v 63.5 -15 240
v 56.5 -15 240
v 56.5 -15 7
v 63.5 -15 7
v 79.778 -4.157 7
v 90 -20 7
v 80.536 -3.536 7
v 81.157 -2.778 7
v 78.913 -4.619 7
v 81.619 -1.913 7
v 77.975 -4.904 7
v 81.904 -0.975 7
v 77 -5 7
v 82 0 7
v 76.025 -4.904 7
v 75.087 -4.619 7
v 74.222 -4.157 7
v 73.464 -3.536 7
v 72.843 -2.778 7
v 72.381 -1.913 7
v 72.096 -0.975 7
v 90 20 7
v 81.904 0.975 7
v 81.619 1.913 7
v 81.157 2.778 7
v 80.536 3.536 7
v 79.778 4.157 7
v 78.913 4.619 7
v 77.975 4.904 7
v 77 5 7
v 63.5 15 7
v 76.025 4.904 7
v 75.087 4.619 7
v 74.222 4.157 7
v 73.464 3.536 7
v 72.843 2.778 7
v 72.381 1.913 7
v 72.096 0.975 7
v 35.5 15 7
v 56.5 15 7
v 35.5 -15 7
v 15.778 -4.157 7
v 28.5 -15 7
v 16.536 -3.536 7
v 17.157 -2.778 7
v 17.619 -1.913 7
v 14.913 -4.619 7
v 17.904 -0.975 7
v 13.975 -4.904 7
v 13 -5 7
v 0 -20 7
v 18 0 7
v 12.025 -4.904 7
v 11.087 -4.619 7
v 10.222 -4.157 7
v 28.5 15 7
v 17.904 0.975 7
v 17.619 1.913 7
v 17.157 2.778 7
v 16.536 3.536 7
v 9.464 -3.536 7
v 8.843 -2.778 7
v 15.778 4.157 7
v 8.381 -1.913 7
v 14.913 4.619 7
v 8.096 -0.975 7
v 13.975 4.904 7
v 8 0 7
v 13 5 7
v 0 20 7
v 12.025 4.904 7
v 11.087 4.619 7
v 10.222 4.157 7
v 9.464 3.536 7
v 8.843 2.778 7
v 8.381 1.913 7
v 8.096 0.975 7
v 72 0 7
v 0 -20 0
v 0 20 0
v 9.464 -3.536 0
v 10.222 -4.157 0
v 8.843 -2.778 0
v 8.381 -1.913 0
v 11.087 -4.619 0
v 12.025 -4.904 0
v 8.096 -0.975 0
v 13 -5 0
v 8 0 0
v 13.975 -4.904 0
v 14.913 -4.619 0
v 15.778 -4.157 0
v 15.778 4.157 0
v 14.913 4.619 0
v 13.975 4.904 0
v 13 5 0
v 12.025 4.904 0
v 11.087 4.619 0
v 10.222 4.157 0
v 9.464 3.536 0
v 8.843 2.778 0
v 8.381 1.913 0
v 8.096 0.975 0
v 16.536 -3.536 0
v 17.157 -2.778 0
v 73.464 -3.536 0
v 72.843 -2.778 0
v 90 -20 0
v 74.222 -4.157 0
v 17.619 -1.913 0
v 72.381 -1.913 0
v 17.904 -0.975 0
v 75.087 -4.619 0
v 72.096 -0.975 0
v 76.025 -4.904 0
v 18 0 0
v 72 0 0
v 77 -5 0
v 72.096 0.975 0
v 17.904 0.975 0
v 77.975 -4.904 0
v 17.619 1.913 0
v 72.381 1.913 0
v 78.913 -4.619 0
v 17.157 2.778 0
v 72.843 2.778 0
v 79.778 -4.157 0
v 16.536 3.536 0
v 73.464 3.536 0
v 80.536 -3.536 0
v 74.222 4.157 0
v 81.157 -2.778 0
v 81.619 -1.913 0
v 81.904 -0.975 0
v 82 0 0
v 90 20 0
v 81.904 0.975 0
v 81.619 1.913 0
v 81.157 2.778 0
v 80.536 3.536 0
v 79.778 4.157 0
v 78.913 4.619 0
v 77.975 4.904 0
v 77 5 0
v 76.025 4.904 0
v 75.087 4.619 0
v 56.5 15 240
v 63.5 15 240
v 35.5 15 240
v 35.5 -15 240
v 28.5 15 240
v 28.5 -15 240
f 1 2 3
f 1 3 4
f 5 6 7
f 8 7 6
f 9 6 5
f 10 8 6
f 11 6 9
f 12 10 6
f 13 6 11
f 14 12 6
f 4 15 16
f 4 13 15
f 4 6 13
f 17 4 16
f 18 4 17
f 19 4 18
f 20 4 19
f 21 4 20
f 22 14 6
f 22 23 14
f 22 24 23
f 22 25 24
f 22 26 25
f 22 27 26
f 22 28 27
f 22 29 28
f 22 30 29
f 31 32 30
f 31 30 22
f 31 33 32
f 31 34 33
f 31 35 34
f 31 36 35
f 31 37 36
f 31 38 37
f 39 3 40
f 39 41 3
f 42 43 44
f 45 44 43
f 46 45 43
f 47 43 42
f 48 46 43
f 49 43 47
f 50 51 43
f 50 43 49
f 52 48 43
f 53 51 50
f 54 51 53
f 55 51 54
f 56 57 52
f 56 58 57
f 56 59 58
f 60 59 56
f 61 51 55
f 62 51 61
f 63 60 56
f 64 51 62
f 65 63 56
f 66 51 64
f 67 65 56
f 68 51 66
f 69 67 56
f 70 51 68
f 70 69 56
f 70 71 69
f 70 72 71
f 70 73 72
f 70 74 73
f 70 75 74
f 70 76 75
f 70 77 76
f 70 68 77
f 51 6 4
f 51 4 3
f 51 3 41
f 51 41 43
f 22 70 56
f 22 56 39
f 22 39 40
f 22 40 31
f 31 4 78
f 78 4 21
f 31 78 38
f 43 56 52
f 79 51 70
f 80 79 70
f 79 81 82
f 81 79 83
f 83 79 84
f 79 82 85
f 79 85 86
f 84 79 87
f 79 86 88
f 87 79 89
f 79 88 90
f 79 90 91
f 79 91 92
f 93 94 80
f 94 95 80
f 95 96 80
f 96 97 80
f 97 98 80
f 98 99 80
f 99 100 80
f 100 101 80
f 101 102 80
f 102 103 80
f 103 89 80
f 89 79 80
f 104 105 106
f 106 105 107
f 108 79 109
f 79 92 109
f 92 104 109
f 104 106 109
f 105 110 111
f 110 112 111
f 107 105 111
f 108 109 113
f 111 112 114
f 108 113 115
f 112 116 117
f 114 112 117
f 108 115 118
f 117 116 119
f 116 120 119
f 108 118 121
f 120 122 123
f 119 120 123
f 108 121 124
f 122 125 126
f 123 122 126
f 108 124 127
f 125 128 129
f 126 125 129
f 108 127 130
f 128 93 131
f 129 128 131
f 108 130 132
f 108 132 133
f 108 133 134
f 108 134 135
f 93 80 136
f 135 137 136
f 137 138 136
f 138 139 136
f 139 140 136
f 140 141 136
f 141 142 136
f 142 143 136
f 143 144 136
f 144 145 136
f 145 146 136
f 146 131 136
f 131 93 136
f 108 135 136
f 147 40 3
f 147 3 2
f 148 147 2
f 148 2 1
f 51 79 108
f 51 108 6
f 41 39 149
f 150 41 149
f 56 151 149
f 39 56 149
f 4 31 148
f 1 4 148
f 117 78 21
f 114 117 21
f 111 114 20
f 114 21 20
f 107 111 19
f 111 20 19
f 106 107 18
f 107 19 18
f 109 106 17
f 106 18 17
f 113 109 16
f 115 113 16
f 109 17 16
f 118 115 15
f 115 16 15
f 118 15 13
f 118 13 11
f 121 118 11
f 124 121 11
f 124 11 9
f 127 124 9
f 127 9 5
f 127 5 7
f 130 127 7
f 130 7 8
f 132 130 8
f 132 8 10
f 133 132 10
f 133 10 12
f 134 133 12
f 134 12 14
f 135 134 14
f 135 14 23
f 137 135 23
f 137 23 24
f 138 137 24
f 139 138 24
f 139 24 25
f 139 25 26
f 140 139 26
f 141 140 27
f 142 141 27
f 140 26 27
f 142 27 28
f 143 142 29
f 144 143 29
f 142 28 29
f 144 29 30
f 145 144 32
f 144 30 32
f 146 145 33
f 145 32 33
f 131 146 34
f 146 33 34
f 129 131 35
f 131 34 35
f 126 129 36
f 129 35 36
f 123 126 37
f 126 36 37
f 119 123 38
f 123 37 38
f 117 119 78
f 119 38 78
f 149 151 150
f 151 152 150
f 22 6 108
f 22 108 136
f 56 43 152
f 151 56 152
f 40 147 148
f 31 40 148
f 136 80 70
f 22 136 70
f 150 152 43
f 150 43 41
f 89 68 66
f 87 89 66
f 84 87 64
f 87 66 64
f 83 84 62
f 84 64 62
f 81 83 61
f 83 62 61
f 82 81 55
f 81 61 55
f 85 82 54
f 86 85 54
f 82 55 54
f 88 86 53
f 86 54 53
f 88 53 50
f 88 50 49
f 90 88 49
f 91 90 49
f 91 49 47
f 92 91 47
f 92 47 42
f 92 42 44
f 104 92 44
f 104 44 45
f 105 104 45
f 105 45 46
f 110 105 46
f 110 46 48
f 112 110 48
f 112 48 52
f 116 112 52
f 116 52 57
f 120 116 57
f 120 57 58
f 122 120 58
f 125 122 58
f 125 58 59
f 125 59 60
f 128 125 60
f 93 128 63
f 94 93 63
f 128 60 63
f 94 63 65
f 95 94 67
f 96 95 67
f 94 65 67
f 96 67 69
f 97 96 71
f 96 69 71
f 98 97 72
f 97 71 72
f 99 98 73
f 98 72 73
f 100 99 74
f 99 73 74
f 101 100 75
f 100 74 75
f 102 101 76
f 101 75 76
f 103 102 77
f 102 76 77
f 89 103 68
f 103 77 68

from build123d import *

# Parameters (mm, degrees)
F0_W     = 40
F0_H     = 7
F1_DEPTH = 90
F4_D     = 10
F5_W     = 7
F5_H     = 240
F6_DEPTH = 15
F7_DEPTH = 15


# Not quite as in the source:
# - a feature names something its author has since deleted; it is built from what else it names


with BuildPart() as f1:
    # F0 (on Right) → F1 (new body)
    with BuildSketch(Plane.YZ):
        with Locations((0, 3.5)):
            Rectangle(F0_W, F0_H)
    extrude(amount=F1_DEPTH)

    # F4 (through all)
    with Locations(Plane(origin=(0, 0, 0), x_dir=(1, 0, 0), z_dir=(0, 0, -1))):
        with Locations((13, 0), (77, 0)):
            Hole(F4_D / 2)

    # F5 (on Front) → F6 (join)
    with BuildSketch(Plane.XZ):
        with Locations((60, 120)):
            Rectangle(F5_W, F5_H)
        with Locations((32, 120)):
            Rectangle(F5_W, F5_H)
    extrude(amount=F6_DEPTH)

    # F7 (add): faces of the model
    f7_faces = [f1.faces().sort_by_distance(p)[0] for p in [
        (32, 0, 123.5),
        (60, 0, 123.5),
    ]]
    extrude(f7_faces, amount=F7_DEPTH)


solid = f1.part
